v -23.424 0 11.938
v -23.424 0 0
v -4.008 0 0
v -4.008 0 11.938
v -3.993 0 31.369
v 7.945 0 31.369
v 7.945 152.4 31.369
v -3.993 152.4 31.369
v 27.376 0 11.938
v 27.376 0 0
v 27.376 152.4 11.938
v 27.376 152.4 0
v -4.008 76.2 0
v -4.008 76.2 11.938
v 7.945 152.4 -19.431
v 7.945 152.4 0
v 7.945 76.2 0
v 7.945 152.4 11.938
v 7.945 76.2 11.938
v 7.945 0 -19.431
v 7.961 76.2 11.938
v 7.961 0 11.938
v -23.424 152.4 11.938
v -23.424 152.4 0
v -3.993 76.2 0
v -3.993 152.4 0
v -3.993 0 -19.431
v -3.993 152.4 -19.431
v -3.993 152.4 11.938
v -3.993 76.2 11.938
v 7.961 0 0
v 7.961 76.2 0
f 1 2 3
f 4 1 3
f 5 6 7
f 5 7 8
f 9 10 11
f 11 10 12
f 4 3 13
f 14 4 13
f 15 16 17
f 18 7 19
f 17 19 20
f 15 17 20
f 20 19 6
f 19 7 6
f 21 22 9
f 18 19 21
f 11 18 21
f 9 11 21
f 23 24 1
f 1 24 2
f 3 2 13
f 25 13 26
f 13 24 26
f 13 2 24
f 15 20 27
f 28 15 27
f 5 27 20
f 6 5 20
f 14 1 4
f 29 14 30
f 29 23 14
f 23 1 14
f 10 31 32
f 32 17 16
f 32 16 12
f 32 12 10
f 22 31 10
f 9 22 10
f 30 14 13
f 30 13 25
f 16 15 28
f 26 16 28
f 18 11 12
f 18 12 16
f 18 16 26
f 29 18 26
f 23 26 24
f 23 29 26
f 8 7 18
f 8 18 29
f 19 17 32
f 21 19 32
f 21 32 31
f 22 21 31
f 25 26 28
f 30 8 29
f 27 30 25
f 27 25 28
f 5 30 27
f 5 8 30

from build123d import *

# Parameters (mm, degrees)
F1_DEPTH = 11.938
F2_W     = 11.938
F2_H     = 19.431
F3_DEPTH = 152.4
F4_W     = 11.938
F4_H     = 76.2
F5_DEPTH = 11.938


with BuildPart() as f1:
    # F0 (on Top) → F1 (new body)
    with BuildSketch(Plane.XY):
        Polygon((-23.423575, 152.4), (-23.423575, 0), (-4.007815, 0), (-4.007815, 76.2), (7.960665, 76.2), (7.960665, 0), (27.376425, 0), (27.376425, 152.4), align=None)
    extrude(amount=F1_DEPTH)

    # F2 (on face) → F3 (join)
    with BuildSketch(Plane(origin=(0, 152.4, 0), x_dir=(-1, 0, 0), z_dir=(0, 1, 0))):
        with Locations((-1.976425, 21.6535)):
            Rectangle(F2_W, F2_H)
        with Locations((-1.976425, -9.7155)):
            Rectangle(F2_W, F2_H)
    extrude(amount=-F3_DEPTH)

    # F4 (on face) → F5 (join)
    with BuildSketch(Plane(origin=(0, 0, 11.938), x_dir=(1, 0, 0), z_dir=(0, 0, -1))):
        with Locations((1.976425, -38.1)):
            Rectangle(F4_W, F4_H)
    extrude(amount=F5_DEPTH)


solid = f1.part
